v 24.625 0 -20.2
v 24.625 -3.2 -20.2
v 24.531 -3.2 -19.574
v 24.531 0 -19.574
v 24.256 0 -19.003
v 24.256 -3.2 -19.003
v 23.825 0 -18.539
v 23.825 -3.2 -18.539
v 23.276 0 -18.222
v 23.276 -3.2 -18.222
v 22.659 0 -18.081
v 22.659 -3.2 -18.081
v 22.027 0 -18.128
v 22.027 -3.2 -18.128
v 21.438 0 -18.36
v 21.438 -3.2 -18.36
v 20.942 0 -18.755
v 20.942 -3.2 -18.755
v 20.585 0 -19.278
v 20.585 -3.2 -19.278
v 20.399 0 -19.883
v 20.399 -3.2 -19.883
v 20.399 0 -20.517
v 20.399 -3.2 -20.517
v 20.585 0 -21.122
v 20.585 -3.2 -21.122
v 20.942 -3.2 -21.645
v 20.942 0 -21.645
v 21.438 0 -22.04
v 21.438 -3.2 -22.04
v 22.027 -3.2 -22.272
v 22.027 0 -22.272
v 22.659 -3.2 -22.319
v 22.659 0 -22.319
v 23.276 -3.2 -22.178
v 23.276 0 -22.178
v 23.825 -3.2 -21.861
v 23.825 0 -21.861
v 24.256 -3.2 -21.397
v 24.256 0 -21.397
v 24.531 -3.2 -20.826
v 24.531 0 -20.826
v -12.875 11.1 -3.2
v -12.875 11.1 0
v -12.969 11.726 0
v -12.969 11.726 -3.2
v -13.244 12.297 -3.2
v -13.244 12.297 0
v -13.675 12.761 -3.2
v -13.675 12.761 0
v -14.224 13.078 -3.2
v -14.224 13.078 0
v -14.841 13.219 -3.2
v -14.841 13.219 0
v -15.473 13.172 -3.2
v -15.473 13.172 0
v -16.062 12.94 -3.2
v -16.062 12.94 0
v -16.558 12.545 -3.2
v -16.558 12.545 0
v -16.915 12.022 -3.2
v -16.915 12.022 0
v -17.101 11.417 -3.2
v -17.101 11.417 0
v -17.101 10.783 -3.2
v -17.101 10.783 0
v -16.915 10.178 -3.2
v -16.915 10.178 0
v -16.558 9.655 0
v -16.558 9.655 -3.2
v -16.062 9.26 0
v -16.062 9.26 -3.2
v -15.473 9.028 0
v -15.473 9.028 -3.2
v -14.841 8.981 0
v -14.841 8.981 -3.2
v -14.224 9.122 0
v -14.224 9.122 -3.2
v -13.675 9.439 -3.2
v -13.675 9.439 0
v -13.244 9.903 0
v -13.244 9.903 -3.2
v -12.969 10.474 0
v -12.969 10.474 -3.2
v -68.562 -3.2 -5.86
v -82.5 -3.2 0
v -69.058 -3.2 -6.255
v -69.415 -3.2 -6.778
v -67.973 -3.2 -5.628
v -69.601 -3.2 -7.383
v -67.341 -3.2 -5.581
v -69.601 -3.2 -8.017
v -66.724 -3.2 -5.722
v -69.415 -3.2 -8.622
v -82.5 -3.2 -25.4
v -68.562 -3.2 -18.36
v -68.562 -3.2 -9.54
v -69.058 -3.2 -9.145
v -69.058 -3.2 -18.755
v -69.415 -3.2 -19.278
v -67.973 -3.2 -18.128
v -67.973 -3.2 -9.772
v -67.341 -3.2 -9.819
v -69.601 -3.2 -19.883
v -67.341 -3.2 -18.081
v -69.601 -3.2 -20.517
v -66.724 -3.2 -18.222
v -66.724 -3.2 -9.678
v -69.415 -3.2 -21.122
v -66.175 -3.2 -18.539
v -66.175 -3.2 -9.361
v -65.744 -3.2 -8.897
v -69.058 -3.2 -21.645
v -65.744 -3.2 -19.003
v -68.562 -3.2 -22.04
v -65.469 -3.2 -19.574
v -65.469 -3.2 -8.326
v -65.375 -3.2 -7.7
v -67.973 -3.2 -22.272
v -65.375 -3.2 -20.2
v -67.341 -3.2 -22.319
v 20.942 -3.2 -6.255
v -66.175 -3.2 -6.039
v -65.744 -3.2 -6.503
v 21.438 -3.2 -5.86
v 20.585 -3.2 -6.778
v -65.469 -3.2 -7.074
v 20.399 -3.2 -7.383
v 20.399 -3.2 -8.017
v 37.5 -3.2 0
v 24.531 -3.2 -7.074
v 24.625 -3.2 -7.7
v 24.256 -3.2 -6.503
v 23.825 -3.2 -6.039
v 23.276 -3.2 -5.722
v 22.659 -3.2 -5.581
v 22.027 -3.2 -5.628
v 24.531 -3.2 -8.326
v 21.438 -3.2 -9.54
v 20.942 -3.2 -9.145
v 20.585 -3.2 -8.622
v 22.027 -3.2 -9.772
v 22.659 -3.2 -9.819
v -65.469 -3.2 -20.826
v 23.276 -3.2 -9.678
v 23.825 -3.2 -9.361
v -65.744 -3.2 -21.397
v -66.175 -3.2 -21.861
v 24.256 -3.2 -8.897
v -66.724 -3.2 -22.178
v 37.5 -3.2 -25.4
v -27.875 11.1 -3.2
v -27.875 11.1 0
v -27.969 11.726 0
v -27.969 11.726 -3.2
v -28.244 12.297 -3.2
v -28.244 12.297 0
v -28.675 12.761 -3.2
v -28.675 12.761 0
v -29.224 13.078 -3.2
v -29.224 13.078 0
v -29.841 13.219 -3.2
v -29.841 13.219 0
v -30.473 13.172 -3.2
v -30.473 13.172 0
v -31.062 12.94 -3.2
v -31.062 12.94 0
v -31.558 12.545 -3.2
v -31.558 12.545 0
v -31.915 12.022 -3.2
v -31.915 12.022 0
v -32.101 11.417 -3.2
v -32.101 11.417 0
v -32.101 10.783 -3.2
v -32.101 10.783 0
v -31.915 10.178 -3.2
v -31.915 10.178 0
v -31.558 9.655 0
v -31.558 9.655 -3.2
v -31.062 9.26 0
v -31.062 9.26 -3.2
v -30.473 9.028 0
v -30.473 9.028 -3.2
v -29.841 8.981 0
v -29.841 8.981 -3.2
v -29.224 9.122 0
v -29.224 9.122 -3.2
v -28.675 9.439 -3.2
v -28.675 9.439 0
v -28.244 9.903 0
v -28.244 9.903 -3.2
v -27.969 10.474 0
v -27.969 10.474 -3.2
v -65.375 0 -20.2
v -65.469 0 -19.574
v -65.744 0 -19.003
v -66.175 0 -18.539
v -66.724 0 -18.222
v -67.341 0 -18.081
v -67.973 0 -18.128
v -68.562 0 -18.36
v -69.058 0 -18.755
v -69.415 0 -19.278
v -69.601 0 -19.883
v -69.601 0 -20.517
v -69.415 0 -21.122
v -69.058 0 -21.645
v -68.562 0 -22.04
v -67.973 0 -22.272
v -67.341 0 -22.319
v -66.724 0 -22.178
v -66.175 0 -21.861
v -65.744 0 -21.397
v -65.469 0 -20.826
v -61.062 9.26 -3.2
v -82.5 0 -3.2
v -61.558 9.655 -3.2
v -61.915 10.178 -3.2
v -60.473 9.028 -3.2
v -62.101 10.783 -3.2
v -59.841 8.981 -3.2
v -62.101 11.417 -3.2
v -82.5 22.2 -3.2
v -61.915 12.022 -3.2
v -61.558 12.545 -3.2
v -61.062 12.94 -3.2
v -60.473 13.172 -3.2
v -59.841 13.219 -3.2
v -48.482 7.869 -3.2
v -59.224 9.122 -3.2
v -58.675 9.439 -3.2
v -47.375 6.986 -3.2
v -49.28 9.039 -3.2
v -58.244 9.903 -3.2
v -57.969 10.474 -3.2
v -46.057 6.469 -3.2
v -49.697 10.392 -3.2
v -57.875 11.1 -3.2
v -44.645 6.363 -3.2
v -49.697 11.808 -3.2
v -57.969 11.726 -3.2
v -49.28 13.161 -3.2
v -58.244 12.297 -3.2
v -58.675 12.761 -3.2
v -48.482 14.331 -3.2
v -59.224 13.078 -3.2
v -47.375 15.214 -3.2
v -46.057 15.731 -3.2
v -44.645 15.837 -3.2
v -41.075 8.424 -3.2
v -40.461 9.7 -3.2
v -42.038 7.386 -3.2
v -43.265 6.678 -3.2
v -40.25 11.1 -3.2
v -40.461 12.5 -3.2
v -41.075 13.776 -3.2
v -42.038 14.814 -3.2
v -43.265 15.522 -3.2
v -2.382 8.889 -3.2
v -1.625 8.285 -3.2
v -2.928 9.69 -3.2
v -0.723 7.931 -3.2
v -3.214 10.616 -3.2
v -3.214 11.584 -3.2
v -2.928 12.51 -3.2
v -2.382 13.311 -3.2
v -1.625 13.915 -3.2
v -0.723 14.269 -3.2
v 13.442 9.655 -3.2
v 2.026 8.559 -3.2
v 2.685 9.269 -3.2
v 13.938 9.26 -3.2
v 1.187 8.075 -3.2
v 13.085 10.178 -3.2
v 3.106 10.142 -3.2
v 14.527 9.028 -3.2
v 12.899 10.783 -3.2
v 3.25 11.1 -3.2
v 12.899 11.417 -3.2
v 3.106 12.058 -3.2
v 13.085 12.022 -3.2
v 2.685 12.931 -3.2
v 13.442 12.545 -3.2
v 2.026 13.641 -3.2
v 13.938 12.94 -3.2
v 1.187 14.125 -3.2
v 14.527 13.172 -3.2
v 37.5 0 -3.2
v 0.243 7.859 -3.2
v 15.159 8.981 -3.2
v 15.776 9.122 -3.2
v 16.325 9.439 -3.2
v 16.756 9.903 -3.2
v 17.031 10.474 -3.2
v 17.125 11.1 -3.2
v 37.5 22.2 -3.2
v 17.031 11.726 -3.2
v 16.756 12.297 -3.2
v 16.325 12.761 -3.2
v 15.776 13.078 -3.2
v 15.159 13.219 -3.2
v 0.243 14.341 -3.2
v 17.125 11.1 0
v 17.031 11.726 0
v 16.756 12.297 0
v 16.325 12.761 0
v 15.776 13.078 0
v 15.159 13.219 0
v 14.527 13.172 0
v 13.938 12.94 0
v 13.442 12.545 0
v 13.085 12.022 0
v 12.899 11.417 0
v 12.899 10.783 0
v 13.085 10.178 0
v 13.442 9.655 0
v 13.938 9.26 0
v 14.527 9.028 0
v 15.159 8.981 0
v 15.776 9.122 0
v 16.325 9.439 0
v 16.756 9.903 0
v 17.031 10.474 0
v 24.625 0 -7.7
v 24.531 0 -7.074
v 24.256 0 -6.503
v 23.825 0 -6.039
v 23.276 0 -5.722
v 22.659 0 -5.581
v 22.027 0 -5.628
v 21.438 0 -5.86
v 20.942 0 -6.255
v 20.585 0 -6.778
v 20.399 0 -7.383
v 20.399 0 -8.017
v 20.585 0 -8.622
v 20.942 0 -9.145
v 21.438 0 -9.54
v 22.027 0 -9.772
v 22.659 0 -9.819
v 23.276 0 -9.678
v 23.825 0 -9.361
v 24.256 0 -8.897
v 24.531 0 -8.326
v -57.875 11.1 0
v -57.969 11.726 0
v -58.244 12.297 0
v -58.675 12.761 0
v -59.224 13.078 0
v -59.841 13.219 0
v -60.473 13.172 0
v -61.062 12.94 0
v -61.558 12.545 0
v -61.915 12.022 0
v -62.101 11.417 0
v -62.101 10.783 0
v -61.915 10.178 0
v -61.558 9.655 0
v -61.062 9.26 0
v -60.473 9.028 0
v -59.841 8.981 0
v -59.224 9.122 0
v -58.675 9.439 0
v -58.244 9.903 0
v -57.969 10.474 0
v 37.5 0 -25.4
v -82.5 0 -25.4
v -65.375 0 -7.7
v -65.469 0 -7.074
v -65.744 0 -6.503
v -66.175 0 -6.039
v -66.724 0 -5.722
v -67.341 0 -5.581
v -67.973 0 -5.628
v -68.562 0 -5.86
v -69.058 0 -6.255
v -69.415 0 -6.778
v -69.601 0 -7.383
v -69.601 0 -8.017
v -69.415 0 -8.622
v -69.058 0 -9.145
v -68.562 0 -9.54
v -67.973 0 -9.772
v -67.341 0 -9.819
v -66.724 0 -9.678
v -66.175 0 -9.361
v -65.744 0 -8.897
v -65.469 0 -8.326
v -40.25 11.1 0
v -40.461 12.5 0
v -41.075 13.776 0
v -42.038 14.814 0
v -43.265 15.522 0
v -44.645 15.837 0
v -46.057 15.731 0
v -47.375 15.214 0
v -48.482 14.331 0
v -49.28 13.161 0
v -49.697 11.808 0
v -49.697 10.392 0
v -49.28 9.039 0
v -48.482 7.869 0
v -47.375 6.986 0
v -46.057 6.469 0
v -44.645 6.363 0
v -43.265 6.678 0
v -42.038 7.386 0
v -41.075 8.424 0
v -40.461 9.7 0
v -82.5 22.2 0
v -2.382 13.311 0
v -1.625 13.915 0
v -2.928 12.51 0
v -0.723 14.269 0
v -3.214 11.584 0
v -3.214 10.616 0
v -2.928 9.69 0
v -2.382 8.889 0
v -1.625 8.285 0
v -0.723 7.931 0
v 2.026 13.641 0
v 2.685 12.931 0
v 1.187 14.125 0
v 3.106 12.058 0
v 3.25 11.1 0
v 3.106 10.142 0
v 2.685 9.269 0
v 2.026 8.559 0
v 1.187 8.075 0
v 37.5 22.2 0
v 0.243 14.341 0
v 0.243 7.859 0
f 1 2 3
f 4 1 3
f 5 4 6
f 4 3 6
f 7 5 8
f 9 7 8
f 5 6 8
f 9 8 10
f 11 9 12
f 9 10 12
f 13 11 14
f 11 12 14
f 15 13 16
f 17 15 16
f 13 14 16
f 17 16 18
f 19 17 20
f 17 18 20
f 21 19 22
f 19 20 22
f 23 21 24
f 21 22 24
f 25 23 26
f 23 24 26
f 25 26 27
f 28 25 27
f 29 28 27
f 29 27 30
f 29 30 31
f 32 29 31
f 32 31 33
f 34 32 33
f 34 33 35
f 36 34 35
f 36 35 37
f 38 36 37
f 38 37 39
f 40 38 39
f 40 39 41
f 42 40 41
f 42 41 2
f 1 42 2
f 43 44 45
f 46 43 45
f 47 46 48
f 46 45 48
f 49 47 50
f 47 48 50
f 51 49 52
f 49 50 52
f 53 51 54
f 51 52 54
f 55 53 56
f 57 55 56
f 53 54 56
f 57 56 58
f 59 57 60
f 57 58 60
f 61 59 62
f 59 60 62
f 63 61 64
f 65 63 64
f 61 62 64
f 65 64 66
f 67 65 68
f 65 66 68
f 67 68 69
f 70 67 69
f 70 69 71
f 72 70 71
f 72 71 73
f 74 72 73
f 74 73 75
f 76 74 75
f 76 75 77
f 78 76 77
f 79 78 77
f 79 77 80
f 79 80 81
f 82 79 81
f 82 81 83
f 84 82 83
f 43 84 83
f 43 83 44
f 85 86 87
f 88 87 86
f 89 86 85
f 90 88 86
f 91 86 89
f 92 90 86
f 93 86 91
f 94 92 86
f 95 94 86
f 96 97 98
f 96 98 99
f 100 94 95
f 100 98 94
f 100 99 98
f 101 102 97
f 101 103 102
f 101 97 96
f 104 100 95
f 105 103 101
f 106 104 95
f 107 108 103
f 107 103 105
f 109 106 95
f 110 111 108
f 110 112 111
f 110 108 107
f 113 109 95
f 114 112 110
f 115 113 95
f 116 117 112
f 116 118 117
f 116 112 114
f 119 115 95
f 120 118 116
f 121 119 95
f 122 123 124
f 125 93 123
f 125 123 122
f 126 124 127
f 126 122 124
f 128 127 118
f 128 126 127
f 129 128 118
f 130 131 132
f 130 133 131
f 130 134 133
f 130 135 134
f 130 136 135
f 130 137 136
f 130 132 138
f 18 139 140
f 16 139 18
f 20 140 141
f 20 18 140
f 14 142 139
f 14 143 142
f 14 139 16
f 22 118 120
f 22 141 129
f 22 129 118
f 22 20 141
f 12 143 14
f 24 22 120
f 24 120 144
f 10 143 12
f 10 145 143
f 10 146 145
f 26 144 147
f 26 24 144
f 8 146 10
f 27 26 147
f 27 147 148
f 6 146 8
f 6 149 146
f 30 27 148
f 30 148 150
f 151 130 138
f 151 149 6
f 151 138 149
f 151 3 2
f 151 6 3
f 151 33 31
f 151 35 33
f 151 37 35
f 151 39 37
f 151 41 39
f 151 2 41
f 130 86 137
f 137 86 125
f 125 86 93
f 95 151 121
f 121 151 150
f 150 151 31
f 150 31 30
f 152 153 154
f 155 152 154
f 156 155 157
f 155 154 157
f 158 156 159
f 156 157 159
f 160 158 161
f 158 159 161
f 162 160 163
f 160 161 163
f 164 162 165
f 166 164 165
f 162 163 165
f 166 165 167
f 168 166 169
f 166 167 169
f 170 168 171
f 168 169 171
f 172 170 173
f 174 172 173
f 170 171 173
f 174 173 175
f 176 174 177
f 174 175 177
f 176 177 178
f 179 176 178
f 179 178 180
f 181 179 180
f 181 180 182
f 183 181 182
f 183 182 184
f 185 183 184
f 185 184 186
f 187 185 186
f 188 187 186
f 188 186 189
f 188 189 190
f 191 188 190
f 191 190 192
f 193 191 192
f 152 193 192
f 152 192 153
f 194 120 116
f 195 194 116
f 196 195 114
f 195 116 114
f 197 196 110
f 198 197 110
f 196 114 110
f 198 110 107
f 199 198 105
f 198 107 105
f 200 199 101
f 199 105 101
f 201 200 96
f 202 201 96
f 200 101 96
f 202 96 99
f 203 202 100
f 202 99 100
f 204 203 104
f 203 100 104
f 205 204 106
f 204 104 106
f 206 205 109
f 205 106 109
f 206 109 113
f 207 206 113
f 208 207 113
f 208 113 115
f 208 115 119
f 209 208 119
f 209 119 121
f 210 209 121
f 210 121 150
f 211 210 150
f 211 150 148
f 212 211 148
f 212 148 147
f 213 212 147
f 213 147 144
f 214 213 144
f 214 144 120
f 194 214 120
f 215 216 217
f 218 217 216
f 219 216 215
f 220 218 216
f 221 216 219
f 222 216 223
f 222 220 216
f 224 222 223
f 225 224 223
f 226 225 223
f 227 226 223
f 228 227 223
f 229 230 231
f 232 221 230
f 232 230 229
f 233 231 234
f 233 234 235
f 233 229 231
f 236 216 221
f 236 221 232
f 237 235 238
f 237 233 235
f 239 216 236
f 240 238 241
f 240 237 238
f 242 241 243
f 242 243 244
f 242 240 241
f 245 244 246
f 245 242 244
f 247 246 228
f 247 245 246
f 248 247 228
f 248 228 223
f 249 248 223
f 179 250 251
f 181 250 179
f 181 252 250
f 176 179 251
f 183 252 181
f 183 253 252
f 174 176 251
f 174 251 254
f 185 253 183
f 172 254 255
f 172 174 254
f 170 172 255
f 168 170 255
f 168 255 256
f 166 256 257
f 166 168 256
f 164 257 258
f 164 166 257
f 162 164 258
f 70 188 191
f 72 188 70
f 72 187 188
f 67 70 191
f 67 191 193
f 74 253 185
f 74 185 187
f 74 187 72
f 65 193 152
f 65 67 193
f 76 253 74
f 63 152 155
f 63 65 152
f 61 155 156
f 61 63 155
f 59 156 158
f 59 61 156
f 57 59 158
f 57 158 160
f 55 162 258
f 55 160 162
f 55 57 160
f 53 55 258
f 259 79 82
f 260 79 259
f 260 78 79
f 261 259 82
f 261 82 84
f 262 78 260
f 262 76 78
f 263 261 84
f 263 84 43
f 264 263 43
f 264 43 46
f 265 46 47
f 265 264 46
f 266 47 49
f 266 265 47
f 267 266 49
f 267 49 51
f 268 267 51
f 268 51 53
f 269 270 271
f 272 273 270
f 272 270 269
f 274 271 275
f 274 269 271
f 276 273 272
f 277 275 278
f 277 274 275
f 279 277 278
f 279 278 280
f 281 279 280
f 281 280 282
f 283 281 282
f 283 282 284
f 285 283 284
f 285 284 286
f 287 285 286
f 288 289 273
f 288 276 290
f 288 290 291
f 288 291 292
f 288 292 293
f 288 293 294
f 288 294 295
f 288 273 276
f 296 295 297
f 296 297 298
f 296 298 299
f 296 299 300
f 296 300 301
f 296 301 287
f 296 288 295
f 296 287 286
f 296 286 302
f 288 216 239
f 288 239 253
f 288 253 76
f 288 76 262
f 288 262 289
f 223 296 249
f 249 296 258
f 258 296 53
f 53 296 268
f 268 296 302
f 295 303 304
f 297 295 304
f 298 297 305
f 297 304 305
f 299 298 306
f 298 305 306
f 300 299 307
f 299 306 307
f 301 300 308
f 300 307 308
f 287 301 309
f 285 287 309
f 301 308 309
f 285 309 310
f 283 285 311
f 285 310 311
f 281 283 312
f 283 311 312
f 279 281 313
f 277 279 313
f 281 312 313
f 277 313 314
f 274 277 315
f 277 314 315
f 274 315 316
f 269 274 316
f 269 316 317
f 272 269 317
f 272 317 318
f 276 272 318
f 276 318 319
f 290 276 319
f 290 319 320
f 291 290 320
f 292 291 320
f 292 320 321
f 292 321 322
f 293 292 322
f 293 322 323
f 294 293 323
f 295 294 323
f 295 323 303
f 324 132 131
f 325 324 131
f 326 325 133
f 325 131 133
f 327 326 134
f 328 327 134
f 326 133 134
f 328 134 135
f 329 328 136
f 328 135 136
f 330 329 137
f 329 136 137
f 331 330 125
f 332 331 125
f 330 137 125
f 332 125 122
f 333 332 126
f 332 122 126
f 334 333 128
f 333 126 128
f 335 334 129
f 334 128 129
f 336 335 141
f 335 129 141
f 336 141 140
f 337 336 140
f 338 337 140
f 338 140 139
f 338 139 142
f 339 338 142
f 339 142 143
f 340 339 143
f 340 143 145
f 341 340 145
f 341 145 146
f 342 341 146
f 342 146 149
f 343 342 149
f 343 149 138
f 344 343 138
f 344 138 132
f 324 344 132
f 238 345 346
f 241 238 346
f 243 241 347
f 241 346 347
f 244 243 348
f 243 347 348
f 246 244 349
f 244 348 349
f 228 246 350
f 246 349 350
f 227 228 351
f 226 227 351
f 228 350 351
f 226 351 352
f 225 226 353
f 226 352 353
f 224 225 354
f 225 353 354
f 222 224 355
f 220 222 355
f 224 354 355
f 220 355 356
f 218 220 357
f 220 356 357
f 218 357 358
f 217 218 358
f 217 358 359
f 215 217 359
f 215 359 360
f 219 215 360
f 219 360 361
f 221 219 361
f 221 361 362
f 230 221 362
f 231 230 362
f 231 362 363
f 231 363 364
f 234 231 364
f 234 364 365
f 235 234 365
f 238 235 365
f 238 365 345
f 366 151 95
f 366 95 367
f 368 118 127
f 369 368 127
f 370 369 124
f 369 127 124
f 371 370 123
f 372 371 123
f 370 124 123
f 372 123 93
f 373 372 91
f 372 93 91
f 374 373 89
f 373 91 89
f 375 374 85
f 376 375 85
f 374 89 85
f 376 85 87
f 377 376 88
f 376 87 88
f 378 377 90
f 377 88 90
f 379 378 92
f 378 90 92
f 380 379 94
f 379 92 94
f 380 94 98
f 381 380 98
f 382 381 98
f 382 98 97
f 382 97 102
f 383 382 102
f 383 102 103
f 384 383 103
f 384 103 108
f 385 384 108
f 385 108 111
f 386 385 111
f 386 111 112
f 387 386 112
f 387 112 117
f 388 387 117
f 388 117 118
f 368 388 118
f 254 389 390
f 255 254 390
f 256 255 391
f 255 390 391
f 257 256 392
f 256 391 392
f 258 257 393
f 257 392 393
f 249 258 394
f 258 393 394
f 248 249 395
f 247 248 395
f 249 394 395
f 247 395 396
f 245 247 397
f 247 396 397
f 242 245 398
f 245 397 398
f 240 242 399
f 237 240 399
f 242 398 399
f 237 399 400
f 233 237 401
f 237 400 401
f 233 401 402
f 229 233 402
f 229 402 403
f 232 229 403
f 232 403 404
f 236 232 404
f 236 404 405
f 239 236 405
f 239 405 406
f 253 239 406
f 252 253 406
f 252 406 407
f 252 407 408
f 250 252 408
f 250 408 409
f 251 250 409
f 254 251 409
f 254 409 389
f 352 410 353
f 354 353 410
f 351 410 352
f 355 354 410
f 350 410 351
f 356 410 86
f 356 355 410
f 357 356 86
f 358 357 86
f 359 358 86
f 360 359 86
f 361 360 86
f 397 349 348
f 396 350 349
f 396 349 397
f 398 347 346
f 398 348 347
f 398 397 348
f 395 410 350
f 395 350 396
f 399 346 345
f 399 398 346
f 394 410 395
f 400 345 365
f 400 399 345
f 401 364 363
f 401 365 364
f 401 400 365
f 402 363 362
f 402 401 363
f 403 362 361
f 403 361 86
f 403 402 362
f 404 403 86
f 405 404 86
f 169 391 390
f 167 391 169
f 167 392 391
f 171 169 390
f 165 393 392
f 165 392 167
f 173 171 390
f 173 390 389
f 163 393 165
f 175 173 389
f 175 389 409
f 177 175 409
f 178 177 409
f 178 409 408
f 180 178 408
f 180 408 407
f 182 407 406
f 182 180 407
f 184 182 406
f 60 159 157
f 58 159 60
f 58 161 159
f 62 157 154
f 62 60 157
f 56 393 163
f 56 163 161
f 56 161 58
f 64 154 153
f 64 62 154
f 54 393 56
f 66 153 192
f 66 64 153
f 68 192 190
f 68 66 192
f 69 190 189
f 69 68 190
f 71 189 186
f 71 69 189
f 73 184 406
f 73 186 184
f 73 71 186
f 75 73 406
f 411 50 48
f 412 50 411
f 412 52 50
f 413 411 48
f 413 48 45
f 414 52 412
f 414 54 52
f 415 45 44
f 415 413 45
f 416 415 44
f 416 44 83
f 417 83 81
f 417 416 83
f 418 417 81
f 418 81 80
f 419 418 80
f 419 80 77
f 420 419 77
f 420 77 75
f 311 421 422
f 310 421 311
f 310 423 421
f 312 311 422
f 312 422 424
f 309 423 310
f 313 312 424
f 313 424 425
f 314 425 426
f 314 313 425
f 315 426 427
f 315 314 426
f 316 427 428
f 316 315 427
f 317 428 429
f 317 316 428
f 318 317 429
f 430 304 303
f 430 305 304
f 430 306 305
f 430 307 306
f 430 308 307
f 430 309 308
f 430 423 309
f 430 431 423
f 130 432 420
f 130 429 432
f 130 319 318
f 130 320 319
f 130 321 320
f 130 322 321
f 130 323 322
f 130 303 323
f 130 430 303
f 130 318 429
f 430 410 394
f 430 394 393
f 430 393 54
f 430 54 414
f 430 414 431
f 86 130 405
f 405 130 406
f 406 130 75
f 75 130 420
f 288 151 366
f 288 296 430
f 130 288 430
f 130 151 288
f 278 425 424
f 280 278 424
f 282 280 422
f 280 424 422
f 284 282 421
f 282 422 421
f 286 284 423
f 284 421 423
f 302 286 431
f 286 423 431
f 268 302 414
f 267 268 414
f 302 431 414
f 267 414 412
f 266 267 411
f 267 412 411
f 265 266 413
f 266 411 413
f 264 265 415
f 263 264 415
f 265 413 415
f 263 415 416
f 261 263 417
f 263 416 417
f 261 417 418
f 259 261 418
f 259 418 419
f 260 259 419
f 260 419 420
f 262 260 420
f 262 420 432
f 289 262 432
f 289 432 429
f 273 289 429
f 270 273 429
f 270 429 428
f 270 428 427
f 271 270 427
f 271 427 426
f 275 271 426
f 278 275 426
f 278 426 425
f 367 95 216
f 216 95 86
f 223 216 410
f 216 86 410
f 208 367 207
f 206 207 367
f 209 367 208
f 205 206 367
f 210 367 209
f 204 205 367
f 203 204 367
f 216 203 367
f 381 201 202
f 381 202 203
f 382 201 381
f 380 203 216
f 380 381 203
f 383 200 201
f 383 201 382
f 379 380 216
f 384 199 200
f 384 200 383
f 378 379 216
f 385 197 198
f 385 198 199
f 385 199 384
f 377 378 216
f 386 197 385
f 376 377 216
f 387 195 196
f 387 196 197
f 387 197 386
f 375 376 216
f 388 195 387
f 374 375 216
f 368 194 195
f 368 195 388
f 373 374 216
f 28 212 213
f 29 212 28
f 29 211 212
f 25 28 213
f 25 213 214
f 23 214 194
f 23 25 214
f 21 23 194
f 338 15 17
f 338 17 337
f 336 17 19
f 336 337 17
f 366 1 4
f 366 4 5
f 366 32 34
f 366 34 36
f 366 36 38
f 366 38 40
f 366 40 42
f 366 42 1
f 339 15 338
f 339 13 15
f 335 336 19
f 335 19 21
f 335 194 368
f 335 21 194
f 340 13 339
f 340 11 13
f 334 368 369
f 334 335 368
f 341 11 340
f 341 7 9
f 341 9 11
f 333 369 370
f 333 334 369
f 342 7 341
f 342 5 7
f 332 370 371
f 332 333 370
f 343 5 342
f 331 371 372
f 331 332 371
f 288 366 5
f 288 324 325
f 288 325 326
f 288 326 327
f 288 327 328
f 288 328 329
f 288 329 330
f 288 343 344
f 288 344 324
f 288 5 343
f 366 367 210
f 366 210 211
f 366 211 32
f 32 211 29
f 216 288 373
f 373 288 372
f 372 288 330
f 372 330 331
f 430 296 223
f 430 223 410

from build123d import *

# Parameters (mm, degrees)
F1_DEPTH = 82.5
F2_R     = 2.125
F2_W     = 45
F2_H     = 25.4
F3_DEPTH = 25.401
F4_R     = 3.25
F4_R_2   = 4.75
F4_R_3   = 2.125
F5_DEPTH = 5


with BuildPart() as f1:
    # F0 (on Right) → F1 (new body, symmetric)
    with BuildSketch(Plane.YZ):
        Polygon((-3.2, -25.4), (0, -25.4), (0, -3.2), (22.2, -3.2), (22.2, 0), (-3.2, 0), align=None)
    extrude(amount=F1_DEPTH, both=True)

    # F2 (on face) → F3 (cut, through all)
    with BuildSketch(Plane.XZ.offset(3.2)):
        with Locations((-67.5, -20.2)):
            Circle(F2_R)
        with Locations((-67.5, -7.7)):
            Circle(F2_R)
        with Locations((22.5, -7.7)):
            Circle(F2_R)
        with Locations((22.5, -20.2)):
            Circle(F2_R)
        with Locations((60, -12.7)):
            Rectangle(F2_W, F2_H)
    extrude(amount=-F3_DEPTH, mode=Mode.SUBTRACT)

    # F4 (on face) → F5 (cut)
    with BuildSketch(Plane.XY):
        with Locations((0, 11.1)):
            Circle(F4_R)
        with Locations((-45, 11.1)):
            Circle(F4_R_2)
        with Locations((-60, 11.1)):
            Circle(F4_R_3)
        with Locations((-30, 11.1)):
            Circle(F4_R_3)
        with Locations((-15, 11.1)):
            Circle(F4_R_3)
        with Locations((15, 11.1)):
            Circle(F4_R_3)
    extrude(amount=-F5_DEPTH, mode=Mode.SUBTRACT)


solid = f1.part
